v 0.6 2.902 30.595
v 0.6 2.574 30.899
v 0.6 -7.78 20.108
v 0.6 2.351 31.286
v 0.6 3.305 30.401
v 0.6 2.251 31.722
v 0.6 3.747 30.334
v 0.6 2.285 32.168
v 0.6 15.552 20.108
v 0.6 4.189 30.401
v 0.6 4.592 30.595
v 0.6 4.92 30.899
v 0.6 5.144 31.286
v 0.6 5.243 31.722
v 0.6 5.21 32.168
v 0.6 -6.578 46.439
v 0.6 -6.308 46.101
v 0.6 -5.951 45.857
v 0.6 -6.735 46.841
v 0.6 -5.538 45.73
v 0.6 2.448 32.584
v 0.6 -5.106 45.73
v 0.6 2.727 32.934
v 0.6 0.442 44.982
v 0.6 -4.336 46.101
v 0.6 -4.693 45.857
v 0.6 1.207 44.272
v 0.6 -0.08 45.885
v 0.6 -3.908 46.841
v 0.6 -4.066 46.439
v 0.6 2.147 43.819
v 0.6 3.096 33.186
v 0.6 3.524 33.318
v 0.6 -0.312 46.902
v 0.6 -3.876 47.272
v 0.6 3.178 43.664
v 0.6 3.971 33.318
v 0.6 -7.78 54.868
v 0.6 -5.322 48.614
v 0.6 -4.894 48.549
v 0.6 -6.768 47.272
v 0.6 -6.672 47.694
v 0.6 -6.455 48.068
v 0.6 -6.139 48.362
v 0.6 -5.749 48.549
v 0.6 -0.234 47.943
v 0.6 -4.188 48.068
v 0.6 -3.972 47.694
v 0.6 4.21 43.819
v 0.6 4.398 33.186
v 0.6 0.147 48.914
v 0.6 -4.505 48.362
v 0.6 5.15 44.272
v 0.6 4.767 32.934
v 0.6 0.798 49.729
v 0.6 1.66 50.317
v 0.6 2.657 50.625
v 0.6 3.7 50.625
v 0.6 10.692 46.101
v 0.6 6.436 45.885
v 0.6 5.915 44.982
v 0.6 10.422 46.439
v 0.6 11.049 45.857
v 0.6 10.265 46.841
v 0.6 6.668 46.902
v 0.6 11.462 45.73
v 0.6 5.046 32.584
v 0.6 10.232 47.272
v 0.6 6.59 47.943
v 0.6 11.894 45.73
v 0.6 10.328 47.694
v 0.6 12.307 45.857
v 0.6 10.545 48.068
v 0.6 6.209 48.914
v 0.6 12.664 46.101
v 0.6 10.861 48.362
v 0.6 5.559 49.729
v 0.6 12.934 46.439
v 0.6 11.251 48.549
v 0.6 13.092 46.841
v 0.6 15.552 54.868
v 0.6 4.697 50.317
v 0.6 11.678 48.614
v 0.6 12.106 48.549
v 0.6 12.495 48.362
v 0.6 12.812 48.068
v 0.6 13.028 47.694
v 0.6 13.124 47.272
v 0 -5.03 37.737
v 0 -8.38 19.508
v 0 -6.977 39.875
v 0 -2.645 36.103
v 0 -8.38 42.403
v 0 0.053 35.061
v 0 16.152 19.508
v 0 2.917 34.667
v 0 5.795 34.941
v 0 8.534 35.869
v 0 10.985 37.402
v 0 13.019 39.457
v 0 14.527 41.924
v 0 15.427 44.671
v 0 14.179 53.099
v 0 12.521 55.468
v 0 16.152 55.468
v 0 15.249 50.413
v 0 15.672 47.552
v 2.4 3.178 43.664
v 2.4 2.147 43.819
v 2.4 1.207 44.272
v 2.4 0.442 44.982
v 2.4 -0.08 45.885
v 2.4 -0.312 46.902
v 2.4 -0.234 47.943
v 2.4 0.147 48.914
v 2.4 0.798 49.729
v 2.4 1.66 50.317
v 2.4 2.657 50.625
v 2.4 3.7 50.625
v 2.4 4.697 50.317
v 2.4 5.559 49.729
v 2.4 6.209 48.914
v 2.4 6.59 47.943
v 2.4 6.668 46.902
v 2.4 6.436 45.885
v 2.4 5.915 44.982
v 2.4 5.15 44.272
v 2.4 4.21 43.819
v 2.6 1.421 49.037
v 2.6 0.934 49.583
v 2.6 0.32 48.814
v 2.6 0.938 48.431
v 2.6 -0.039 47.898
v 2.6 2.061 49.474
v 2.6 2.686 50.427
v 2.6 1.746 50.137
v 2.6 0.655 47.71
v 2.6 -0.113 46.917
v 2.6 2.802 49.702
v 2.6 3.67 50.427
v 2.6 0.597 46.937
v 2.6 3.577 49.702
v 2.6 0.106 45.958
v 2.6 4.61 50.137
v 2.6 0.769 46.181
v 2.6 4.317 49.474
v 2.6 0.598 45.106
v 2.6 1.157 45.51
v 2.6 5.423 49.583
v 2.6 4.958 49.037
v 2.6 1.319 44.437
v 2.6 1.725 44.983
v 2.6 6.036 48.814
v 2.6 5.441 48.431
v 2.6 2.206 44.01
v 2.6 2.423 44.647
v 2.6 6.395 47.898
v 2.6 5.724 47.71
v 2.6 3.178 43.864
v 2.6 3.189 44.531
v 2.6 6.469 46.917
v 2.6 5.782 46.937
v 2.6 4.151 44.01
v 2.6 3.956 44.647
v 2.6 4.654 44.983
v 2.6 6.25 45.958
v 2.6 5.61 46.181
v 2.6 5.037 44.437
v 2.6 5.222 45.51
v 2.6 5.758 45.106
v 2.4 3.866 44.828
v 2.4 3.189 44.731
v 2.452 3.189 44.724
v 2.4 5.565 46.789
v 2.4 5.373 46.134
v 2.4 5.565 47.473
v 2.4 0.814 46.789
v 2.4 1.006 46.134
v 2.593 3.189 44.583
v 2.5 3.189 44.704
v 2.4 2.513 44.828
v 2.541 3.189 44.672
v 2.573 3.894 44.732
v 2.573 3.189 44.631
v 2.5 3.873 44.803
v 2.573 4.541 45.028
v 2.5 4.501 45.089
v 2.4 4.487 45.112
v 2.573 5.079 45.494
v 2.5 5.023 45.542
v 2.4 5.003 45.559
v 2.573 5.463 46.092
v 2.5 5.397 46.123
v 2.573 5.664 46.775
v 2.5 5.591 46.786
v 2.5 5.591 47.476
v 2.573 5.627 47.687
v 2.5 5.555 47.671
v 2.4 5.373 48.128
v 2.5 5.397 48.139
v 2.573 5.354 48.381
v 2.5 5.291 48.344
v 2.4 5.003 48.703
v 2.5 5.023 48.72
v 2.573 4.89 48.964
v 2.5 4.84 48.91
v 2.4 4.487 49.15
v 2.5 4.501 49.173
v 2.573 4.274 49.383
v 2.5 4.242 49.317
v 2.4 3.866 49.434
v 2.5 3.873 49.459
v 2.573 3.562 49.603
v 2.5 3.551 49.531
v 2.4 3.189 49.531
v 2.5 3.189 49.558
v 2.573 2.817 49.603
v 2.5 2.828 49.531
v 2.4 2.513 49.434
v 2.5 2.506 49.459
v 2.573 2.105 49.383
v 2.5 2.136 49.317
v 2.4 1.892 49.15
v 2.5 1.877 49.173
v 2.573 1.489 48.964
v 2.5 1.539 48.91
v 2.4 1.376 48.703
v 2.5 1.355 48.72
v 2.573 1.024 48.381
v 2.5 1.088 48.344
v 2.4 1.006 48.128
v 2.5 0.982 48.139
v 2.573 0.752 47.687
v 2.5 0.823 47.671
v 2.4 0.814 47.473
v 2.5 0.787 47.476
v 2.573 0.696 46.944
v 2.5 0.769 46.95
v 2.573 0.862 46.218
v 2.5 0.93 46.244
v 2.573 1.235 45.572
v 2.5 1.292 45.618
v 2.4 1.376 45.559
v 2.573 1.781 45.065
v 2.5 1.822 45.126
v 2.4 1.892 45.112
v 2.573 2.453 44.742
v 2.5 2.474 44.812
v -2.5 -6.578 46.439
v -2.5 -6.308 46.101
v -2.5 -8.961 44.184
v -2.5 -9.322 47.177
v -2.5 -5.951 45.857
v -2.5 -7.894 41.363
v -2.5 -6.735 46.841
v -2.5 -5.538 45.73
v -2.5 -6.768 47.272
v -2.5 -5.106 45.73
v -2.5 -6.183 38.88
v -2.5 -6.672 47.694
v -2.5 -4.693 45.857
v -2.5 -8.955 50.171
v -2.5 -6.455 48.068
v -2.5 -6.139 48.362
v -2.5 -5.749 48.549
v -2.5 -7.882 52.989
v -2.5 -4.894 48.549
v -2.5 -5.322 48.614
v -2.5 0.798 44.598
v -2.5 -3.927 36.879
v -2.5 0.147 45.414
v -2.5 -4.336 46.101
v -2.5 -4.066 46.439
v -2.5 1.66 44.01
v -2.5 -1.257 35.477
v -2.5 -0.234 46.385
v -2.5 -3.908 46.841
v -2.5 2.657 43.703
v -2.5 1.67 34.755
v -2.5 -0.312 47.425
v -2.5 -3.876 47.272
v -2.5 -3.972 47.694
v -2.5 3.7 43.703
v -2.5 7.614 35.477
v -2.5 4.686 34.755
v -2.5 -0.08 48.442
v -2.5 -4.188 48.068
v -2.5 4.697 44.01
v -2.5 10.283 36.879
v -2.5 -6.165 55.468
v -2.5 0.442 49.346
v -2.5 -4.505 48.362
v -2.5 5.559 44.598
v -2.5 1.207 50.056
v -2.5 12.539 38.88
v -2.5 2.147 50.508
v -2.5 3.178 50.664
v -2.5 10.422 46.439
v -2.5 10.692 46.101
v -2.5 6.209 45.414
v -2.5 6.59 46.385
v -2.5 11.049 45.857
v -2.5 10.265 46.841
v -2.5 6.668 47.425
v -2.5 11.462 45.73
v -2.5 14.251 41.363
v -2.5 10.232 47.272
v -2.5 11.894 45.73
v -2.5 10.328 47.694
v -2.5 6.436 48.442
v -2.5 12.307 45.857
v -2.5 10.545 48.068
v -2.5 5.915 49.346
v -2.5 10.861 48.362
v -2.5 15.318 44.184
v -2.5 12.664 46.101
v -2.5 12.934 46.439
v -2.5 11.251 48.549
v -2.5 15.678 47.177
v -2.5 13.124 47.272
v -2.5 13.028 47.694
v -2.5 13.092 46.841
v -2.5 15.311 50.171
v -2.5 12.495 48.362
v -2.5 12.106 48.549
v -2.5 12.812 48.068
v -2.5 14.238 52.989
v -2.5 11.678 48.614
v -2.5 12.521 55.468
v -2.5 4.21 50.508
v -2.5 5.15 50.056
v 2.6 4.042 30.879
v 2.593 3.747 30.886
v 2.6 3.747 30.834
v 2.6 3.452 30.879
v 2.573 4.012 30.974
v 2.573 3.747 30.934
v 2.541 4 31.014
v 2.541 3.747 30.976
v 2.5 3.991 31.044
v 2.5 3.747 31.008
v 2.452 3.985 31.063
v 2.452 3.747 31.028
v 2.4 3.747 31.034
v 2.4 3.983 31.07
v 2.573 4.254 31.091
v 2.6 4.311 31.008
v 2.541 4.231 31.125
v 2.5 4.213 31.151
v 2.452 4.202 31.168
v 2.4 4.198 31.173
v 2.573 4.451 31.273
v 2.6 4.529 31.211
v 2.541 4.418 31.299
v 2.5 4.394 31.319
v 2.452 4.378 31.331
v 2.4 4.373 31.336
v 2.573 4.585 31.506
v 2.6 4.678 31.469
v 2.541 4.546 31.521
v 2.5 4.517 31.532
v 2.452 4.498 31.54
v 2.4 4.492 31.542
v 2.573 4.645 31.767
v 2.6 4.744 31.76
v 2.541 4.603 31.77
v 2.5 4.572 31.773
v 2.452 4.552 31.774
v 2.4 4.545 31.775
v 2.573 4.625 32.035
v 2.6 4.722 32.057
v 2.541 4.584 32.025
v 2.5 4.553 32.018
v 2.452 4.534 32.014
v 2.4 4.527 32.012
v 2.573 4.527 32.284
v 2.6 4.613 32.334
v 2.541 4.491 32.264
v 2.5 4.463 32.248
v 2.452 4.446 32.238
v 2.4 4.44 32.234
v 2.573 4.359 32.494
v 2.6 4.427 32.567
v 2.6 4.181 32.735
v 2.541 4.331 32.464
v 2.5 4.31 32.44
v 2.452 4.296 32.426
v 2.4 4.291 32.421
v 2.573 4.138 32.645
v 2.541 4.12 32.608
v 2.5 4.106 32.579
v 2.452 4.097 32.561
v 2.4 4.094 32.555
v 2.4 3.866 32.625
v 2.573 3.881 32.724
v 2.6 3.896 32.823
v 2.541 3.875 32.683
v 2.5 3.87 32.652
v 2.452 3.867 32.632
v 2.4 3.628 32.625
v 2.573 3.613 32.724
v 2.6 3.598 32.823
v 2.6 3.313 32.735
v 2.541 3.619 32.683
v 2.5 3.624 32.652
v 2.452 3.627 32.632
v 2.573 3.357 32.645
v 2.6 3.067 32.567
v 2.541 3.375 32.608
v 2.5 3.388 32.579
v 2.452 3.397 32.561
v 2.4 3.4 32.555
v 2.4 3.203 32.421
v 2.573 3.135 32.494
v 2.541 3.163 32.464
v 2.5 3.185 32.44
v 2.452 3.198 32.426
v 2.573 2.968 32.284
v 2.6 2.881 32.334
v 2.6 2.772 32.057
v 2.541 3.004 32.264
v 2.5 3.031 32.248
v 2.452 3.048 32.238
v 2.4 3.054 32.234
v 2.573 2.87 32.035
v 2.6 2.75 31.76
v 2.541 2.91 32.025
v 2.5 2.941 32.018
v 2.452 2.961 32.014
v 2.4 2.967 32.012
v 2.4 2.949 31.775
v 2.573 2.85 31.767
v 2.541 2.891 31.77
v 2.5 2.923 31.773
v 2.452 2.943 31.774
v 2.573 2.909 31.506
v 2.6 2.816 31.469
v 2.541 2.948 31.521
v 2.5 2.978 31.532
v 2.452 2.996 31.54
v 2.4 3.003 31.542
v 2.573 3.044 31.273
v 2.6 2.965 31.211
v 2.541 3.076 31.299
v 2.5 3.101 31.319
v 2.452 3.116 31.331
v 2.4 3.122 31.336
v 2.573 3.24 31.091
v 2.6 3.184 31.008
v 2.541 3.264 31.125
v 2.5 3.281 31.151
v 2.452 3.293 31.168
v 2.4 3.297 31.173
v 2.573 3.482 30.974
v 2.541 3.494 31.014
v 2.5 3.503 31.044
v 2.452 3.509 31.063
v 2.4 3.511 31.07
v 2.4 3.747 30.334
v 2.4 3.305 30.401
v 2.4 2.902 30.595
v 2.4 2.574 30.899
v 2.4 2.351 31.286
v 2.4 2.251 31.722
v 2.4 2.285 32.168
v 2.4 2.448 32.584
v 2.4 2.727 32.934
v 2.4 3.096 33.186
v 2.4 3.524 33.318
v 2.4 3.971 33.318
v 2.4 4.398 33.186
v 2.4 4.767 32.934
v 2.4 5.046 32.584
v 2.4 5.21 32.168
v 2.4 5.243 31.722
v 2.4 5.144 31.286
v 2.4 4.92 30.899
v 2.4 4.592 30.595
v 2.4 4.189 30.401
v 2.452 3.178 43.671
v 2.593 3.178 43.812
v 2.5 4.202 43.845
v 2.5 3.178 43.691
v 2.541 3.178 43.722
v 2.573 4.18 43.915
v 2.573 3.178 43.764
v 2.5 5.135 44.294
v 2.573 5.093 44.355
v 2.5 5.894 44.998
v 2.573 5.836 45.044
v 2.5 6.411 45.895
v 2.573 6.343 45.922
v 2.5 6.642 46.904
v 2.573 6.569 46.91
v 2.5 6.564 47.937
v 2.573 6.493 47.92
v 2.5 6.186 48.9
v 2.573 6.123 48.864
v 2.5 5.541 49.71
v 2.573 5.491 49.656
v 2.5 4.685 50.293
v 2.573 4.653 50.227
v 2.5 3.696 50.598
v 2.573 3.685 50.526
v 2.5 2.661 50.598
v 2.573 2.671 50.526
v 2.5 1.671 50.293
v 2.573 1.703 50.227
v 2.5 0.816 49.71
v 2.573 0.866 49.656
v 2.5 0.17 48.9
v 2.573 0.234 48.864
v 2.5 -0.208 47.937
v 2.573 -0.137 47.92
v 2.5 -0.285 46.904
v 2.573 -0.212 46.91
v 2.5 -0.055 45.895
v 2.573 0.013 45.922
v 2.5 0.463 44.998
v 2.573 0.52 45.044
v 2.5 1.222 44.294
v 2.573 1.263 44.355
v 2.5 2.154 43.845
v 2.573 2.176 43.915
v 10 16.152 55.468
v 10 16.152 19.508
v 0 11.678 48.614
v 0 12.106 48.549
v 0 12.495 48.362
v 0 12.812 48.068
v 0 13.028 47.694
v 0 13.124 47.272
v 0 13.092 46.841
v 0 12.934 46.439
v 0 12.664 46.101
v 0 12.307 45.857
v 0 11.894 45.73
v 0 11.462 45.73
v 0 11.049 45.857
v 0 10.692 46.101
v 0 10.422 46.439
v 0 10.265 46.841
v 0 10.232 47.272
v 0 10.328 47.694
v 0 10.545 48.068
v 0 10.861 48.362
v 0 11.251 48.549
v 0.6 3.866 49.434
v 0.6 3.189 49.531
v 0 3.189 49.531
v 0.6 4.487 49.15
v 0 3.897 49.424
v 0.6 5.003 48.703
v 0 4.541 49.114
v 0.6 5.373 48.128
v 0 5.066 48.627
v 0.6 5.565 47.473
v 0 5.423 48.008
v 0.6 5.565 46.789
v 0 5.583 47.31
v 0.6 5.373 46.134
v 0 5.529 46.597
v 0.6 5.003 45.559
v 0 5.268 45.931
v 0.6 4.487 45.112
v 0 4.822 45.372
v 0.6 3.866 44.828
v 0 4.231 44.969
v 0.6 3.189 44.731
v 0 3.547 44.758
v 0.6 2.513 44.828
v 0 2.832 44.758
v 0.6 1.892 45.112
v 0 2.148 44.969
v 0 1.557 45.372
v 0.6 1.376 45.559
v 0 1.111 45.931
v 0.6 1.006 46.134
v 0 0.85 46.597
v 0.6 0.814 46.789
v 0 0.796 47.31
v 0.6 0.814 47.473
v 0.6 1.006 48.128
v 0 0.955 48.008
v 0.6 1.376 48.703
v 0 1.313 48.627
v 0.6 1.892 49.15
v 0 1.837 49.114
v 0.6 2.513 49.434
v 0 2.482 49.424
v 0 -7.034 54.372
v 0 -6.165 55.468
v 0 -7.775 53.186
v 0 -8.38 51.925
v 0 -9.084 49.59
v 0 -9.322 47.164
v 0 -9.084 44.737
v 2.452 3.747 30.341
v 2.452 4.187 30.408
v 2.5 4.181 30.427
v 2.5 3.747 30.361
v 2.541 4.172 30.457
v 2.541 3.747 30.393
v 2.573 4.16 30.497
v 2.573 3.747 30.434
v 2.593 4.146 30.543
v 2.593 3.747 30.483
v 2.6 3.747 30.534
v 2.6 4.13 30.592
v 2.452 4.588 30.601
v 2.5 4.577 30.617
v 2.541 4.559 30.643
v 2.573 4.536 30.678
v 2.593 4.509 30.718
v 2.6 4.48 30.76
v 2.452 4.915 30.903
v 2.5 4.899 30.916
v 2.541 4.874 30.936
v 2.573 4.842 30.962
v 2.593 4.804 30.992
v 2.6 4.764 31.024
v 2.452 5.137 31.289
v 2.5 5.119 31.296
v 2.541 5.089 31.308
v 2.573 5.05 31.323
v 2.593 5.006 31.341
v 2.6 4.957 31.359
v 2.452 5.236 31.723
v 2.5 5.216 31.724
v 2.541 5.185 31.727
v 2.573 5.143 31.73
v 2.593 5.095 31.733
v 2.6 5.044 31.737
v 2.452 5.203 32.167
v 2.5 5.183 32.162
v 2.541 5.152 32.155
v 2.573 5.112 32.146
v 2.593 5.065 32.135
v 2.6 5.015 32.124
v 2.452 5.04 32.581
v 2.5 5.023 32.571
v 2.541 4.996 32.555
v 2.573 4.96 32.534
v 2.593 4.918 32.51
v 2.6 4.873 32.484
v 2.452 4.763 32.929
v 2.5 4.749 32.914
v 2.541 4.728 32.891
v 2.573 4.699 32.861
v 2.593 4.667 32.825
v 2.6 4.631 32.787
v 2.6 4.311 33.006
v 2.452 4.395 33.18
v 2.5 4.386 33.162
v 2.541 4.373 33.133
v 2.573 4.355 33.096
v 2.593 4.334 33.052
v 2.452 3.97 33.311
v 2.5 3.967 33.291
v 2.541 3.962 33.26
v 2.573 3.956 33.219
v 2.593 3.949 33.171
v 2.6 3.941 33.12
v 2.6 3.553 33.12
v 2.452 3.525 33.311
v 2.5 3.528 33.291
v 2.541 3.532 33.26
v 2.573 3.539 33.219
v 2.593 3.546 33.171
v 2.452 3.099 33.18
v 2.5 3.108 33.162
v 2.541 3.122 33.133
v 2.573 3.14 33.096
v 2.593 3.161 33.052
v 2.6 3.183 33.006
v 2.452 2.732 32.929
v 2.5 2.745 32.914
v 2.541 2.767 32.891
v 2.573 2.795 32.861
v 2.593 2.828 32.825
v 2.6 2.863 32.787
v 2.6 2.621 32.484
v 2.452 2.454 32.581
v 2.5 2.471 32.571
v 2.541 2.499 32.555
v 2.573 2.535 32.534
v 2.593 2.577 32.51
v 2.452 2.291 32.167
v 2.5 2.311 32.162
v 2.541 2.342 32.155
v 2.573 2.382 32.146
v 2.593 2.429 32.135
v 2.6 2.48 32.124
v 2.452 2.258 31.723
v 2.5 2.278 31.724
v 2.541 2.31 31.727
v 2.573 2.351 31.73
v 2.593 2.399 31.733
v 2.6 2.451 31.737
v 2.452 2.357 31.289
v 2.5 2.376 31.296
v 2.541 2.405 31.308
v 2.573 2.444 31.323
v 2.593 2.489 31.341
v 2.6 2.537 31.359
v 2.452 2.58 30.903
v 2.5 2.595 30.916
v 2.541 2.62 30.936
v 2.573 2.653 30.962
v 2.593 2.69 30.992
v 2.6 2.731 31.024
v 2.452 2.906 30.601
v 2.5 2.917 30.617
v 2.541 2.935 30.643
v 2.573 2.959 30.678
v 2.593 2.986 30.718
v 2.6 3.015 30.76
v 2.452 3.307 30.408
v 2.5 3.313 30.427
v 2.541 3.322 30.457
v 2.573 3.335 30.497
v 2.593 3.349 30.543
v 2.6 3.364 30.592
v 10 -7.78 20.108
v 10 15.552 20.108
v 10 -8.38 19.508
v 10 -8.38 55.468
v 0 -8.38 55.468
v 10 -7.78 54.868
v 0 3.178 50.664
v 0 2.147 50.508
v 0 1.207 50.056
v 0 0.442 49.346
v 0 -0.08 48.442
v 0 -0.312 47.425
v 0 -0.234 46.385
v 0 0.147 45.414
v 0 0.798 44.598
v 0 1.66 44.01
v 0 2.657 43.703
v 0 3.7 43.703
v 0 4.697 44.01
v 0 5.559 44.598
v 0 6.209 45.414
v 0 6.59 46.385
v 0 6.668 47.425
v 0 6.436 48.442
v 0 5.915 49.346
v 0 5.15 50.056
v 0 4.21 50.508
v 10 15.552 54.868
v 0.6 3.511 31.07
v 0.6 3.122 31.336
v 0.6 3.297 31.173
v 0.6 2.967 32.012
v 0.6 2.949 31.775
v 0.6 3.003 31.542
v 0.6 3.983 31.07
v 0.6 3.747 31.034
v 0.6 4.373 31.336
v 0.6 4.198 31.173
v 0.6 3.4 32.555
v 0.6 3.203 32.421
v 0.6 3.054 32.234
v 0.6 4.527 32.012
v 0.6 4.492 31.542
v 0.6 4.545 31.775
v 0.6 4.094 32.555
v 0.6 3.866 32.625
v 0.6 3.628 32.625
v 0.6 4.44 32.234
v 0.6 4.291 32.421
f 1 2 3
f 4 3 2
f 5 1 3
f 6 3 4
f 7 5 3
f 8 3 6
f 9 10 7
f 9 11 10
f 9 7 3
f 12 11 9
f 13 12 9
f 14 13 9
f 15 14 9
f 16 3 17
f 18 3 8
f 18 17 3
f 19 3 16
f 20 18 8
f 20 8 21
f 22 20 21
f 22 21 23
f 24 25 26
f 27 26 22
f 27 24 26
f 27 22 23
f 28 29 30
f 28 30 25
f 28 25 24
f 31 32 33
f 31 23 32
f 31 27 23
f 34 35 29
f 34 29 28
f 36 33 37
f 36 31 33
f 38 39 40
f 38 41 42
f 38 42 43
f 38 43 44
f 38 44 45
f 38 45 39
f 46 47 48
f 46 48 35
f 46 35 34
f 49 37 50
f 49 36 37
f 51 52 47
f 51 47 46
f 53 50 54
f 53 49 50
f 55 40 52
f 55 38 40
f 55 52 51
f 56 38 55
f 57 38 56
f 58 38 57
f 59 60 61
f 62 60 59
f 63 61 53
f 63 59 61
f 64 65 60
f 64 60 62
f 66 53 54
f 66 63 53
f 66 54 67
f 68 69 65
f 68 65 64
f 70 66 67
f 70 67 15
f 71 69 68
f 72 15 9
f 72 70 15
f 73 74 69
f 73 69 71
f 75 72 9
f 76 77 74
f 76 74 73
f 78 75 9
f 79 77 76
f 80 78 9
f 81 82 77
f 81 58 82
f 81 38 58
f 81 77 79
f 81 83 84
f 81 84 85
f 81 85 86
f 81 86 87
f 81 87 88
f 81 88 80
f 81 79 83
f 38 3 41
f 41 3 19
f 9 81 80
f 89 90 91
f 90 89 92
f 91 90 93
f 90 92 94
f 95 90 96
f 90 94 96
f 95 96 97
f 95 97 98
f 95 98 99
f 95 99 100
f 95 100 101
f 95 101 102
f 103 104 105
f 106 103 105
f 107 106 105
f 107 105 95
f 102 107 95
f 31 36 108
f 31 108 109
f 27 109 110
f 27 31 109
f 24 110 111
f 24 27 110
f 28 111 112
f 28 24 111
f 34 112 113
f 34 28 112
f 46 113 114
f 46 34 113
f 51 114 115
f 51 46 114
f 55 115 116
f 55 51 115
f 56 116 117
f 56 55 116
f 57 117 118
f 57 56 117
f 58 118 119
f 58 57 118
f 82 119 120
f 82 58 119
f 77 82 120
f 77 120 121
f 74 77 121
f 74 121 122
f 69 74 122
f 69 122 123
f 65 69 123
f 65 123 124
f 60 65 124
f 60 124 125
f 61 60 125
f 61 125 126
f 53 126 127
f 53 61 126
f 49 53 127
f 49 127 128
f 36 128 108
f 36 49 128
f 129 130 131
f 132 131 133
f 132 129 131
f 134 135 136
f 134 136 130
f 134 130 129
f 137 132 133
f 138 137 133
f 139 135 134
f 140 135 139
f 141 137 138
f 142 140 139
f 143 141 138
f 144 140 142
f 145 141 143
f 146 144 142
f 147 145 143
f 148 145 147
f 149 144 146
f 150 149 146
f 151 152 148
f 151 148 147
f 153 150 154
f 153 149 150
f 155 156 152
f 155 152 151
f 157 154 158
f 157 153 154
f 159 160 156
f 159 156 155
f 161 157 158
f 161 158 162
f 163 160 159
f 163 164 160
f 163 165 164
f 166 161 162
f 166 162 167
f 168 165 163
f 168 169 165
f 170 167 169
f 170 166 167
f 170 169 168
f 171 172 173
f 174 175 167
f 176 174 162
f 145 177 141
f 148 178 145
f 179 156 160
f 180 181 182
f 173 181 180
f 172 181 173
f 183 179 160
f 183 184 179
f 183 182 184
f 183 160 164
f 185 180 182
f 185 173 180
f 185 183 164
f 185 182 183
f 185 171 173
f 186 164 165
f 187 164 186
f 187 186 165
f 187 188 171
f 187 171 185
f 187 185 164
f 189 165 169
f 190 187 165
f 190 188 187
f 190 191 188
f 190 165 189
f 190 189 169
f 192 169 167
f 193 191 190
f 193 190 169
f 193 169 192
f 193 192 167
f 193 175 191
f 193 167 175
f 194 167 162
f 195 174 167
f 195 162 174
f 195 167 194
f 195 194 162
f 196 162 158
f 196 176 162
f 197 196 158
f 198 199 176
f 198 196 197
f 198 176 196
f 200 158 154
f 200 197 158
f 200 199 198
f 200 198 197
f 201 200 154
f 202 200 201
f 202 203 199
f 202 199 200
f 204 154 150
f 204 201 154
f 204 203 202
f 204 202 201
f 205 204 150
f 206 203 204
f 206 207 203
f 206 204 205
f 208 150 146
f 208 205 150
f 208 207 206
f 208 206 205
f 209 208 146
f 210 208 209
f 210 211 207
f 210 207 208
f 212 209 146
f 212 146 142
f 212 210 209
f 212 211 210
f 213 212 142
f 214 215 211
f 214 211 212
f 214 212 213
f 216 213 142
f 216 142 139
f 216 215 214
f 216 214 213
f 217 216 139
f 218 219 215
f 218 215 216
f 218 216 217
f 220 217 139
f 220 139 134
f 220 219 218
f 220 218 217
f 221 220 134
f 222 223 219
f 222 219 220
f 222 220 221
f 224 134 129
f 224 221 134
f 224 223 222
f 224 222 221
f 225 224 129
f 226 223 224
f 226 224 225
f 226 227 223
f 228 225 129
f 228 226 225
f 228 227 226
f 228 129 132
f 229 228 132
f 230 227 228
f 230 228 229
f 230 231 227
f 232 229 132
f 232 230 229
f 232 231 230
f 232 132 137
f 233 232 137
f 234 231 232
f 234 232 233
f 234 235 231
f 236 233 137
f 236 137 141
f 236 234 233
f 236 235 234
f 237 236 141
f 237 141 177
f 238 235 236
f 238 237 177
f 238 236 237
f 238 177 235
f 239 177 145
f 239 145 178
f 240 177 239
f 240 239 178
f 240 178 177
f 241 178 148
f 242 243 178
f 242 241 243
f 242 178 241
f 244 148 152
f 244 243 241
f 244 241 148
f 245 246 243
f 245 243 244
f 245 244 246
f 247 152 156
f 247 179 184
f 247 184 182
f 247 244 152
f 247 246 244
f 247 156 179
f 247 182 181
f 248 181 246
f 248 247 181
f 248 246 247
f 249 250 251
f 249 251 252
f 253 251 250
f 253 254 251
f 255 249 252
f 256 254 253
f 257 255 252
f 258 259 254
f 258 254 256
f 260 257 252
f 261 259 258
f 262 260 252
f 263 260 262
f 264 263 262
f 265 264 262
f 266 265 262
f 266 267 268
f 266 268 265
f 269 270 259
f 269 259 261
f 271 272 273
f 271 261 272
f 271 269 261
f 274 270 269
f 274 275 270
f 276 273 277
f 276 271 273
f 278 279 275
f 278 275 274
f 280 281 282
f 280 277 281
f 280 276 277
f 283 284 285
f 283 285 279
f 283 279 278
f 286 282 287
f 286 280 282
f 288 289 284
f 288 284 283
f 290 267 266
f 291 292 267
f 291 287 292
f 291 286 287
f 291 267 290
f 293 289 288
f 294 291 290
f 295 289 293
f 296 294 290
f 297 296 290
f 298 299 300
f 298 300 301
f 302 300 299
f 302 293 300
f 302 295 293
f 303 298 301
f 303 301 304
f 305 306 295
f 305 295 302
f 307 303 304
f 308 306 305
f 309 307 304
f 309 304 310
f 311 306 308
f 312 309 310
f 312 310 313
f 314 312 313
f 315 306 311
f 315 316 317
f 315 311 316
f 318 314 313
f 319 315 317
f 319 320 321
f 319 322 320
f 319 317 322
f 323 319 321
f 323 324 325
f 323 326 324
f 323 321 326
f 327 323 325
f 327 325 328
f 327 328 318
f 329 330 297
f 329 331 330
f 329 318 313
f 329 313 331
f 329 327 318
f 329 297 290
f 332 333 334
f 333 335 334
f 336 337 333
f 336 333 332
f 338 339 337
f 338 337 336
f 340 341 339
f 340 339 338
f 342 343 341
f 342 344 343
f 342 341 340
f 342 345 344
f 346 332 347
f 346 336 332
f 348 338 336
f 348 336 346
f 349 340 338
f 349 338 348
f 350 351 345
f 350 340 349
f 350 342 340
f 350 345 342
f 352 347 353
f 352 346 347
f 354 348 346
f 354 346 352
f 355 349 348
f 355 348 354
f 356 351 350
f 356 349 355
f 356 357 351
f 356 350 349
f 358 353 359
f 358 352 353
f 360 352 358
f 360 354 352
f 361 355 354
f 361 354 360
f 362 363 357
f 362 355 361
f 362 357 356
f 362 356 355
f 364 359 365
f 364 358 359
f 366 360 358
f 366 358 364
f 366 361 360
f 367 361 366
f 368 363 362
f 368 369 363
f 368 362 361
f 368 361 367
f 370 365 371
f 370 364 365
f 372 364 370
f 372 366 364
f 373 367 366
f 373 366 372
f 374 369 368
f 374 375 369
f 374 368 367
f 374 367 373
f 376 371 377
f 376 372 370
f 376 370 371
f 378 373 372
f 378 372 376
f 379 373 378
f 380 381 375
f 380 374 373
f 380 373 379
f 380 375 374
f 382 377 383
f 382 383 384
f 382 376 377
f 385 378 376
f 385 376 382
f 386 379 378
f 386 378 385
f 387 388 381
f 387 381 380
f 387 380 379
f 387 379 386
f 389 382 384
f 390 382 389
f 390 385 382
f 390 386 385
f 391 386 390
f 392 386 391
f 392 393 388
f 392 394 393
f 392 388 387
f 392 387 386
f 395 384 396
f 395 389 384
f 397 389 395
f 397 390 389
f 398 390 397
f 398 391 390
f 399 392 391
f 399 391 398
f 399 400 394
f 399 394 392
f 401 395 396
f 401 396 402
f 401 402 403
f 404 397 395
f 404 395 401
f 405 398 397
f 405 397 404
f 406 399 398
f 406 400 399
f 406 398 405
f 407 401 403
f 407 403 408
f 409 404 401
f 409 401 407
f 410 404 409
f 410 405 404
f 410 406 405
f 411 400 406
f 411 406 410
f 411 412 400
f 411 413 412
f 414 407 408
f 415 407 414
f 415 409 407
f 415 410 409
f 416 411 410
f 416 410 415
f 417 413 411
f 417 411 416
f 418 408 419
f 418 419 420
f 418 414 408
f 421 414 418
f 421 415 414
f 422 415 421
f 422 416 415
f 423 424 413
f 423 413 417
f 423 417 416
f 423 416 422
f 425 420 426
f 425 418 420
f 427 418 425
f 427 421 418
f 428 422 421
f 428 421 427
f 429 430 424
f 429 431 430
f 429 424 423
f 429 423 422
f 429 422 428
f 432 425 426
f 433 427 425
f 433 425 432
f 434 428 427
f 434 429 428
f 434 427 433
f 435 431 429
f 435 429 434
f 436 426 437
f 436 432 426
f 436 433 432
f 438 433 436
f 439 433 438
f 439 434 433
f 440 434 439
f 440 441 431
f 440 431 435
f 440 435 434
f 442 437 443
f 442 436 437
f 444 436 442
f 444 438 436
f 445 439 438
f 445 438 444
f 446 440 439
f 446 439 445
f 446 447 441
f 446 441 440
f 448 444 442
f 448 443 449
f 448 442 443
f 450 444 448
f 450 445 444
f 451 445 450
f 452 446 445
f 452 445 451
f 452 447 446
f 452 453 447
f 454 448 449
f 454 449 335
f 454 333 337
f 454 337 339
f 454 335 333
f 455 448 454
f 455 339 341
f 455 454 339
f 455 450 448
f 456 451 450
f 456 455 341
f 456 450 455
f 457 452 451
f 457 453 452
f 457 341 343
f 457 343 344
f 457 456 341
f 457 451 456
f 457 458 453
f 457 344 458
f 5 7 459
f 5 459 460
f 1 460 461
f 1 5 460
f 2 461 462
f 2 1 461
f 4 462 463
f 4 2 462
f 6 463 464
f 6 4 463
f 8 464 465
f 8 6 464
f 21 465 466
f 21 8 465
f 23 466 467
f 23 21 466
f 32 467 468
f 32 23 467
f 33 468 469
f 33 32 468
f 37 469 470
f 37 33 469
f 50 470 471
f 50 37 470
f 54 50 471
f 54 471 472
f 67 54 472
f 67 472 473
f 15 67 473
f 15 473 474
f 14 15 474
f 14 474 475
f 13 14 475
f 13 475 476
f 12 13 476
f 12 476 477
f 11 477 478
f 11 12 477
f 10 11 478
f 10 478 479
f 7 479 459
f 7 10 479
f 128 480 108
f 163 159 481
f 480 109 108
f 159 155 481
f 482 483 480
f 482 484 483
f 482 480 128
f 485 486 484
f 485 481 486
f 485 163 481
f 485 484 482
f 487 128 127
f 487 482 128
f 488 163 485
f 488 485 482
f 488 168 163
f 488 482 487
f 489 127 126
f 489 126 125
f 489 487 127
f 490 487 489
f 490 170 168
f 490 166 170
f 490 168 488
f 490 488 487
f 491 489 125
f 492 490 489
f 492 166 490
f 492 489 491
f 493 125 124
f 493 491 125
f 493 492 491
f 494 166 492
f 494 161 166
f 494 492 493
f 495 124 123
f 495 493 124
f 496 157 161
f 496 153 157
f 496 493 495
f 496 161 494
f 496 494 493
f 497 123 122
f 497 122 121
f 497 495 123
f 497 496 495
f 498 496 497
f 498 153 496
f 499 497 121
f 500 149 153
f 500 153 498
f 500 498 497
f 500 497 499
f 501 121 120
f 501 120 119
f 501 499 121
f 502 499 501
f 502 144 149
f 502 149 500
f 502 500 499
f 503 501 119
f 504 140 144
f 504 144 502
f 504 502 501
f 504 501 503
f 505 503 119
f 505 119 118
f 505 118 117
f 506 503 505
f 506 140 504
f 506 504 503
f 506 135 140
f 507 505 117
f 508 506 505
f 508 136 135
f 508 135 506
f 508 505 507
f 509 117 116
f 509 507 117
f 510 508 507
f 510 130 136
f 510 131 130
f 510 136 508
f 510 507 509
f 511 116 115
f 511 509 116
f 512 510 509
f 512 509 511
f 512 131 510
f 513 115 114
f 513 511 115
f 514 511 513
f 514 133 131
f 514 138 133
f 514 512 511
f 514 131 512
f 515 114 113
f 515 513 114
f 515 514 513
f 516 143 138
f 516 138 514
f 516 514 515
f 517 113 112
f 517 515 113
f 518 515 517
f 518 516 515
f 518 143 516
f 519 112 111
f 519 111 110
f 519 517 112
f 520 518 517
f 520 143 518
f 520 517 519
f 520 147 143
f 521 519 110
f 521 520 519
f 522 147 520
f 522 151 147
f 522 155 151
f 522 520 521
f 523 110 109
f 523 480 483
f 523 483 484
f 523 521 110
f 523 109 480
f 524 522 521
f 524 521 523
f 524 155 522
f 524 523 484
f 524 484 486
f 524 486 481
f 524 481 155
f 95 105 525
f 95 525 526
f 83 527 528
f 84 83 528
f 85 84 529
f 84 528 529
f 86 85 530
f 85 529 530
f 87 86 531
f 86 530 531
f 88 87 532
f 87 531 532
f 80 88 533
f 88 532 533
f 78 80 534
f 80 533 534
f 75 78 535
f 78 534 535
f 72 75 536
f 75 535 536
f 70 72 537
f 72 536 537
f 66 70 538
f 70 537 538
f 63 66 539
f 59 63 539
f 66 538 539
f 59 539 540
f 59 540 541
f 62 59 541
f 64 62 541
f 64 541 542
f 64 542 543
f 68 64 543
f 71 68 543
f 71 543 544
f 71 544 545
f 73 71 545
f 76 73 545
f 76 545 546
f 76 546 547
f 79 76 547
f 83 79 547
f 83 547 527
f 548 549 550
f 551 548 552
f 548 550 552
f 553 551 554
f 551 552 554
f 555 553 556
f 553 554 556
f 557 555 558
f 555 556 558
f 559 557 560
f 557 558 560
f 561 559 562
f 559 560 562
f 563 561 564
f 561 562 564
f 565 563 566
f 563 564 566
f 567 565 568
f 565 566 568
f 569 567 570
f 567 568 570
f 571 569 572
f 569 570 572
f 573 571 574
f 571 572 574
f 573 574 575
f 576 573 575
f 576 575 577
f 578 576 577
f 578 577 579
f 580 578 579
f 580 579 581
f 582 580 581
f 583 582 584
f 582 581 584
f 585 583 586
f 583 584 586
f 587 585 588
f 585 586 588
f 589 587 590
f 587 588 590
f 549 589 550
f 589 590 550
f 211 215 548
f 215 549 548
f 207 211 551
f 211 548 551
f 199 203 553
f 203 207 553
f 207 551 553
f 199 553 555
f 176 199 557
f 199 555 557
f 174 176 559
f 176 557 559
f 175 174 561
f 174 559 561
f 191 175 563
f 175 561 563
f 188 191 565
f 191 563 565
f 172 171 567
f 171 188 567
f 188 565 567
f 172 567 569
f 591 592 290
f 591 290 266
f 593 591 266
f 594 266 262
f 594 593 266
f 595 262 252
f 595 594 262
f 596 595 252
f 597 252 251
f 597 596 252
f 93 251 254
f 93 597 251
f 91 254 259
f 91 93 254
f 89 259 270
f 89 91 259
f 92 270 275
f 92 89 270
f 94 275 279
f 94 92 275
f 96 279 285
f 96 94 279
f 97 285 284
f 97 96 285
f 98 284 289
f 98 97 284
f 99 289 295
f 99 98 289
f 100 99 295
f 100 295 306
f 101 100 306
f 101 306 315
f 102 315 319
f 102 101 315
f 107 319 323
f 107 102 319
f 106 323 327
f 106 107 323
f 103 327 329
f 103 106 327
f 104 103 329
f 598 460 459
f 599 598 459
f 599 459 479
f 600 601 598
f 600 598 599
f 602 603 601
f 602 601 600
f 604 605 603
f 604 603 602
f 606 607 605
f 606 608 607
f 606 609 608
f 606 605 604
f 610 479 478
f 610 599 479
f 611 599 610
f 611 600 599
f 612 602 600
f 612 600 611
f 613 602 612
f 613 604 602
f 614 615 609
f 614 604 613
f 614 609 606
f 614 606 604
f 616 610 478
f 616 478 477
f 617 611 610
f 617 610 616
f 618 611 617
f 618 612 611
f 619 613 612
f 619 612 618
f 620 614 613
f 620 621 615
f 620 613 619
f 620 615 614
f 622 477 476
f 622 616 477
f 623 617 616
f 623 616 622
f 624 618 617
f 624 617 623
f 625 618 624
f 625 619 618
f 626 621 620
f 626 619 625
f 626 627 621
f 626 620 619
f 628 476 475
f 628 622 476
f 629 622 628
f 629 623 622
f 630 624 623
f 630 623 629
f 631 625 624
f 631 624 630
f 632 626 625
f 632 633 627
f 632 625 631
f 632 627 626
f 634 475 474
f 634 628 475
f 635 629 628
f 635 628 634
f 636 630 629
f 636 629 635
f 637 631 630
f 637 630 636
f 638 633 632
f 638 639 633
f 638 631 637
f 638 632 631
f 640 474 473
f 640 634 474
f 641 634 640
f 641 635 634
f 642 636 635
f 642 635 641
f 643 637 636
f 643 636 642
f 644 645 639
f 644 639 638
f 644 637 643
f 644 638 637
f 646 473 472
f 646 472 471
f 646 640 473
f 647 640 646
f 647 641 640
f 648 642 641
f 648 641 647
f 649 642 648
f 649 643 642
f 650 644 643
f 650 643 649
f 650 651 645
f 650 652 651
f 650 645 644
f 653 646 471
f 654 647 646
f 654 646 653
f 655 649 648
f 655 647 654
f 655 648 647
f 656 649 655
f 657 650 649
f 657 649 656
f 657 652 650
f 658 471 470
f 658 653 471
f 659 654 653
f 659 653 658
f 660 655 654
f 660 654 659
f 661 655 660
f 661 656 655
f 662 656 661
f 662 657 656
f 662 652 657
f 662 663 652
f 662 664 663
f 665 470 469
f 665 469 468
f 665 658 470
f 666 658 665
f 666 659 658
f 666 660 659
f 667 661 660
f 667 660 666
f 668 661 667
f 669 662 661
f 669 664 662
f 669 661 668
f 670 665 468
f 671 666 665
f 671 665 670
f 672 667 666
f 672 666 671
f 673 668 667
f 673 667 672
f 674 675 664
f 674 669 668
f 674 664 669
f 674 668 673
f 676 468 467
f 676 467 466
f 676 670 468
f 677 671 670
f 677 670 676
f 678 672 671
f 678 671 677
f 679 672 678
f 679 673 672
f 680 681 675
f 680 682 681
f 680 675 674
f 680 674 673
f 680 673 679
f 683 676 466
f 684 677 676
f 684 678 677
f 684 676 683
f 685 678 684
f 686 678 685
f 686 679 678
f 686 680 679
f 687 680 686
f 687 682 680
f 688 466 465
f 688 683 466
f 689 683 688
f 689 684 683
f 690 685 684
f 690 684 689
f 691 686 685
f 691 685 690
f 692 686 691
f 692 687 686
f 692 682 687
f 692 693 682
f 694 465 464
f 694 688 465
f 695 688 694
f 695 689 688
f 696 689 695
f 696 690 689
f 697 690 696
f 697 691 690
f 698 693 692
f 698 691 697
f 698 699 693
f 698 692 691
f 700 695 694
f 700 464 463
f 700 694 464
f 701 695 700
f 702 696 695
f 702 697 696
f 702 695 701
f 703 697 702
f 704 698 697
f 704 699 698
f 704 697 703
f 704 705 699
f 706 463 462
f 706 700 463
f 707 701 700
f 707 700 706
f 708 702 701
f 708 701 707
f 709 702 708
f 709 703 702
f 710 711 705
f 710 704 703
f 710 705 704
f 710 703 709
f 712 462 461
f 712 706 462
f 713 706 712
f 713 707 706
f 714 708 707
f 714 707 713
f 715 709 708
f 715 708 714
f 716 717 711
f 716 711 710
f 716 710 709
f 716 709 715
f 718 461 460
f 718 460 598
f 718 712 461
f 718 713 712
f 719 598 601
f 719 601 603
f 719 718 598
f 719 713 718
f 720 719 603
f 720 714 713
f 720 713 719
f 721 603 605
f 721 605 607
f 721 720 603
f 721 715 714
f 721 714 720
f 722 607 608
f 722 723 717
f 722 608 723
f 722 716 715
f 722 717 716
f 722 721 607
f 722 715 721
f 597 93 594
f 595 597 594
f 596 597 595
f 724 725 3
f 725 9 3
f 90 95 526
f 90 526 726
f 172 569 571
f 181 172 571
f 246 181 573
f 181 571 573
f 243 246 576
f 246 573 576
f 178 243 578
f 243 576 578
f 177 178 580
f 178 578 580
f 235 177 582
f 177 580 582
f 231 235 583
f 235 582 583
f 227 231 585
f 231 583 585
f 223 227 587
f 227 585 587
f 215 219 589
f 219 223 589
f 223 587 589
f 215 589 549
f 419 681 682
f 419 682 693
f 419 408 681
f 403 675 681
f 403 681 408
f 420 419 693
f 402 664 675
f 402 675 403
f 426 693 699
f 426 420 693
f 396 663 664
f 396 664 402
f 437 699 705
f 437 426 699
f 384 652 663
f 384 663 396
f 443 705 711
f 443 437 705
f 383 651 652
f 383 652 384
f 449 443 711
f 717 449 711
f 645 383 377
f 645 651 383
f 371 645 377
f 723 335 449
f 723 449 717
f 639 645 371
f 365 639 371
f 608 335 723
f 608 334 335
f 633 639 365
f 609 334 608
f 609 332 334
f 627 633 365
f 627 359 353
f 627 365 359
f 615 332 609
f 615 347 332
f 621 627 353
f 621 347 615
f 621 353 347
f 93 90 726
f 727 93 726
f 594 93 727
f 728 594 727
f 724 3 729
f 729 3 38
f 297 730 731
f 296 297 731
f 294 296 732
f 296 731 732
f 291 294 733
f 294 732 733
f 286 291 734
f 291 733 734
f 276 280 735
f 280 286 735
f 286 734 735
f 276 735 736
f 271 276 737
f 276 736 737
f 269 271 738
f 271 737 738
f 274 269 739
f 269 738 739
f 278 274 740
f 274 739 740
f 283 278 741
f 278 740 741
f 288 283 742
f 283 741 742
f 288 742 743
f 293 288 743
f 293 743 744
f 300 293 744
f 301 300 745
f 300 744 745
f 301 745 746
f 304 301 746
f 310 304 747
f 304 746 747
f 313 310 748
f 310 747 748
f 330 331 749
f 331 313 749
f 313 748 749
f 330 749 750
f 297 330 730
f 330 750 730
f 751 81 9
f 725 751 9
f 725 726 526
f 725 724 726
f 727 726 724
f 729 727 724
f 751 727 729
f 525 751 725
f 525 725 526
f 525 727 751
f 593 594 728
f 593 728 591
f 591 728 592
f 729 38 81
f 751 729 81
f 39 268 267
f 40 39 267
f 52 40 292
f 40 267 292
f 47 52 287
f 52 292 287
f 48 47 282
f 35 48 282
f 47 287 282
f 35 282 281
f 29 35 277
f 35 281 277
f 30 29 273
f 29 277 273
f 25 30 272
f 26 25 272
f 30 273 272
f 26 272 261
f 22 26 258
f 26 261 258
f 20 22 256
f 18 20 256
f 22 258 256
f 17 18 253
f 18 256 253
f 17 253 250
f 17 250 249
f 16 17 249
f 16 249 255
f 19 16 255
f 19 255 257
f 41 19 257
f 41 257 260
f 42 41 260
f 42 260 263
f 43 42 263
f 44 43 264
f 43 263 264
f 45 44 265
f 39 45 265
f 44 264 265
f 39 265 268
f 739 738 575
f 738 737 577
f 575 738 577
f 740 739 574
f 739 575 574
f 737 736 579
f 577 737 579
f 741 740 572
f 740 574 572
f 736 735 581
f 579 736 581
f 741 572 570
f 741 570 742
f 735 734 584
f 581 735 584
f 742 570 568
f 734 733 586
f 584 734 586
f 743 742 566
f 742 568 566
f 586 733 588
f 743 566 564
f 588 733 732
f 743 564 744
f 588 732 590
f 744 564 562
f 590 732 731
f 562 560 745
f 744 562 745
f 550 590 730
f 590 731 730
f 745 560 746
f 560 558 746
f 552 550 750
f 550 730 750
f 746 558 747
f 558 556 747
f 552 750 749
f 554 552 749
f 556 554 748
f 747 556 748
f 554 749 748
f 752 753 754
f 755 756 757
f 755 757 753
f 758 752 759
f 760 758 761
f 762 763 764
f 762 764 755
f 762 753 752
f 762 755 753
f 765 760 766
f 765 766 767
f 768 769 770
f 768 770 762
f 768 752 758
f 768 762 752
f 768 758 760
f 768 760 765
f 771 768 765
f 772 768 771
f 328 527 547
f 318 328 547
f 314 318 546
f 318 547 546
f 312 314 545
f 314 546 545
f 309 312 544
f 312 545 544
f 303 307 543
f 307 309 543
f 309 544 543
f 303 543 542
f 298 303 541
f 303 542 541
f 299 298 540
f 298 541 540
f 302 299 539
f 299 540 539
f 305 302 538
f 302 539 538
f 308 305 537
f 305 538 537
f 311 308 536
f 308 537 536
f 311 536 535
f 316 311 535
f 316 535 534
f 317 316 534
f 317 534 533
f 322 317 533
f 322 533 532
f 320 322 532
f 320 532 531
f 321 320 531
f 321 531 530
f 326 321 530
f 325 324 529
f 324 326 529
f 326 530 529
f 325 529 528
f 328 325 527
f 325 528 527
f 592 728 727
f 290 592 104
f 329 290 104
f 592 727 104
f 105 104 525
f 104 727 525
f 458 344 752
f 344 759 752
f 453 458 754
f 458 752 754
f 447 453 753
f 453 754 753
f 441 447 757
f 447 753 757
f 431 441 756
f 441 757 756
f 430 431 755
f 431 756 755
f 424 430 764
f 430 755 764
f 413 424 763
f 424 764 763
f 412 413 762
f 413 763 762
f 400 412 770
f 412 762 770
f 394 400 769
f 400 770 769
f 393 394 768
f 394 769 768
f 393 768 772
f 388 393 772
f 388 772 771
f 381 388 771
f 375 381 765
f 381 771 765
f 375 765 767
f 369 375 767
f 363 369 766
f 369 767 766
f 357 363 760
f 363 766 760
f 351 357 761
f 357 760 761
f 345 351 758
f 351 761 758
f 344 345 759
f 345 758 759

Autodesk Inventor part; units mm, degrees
ref_plane "YZ Plane" through (0, 0, 0) normal (1, 0, 0) x (0, 1, 0)
ref_plane "XZ Plane" through (0, 0, 0) normal (0, 1, 0) x (-1, 0, 0)
ref_plane "XY Plane" through (0, 0, 0) normal (0, 0, 1) x (1, 0, 0)
sketch "Sketch1" plane through (0, 0, 0) normal (1, 0, 0) x (0, 1, 0)
  circle A0 centre (3.7472, 31.8344) radius 0.7 projected
  arc A1 (6.295, 21.1336) -> (6.4355, 23.5076) centre (-1.824, 22.8051) ccw projected
  arc A2 (5.4476, 20.9667) -> (6.295, 21.1336) centre (3.7472, 31.8344) ccw projected
  arc A3 (4.4173, 23.1101) -> (5.4476, 20.9667) centre (12.3263, 25.5922) ccw projected
  arc A4 (3.7308, 23.0845) -> (4.4173, 23.1101) centre (3.7472, 31.8344) ccw projected
  arc A5 (2.8636, 20.87) -> (3.7308, 23.0845) centre (-4.3415, 24.9686) ccw projected
  arc A6 (2.006, 20.9731) -> (2.8636, 20.87) centre (3.7472, 31.8344) ccw projected
  arc A7 (1.6886, 23.33) -> (2.006, 20.9731) centre (9.9774, 23.2466) ccw projected
  arc A8 (1.0277, 23.5178) -> (1.6886, 23.33) centre (3.7472, 31.8344) ccw projected
  arc A9 (-0.4814, 21.6797) -> (1.0277, 23.5178) centre (-6.0673, 27.8042) ccw projected
  arc A10 (-1.2651, 22.0427) -> (-0.4814, 21.6797) centre (3.7472, 31.8344) ccw projected
  arc A11 (-0.8387, 24.3824) -> (-1.2651, 22.0427) centre (7.0187, 21.7417) ccw projected
  arc A12 (-1.4092, 24.7652) -> (-0.8387, 24.3824) centre (3.7472, 31.8344) ccw projected
  arc A13 (-3.4124, 23.4834) -> (-1.4092, 24.7652) centre (-6.8324, 31.0342) ccw projected
  arc A14 (-4.0456, 24.0709) -> (-3.4124, 23.4834) centre (3.7472, 31.8344) ccw projected
  arc A15 (-2.917, 26.1642) -> (-4.0456, 24.0709) centre (3.7397, 21.2247) ccw projected
  arc A16 (-3.3414, 26.7046) -> (-2.917, 26.1642) centre (3.7472, 31.8344) ccw projected
  arc A17 (-5.6426, 26.1045) -> (-3.3414, 26.7046) centre (-6.5618, 34.3427) ccw projected
  arc A18 (-6.0632, 26.8589) -> (-5.6426, 26.1045) centre (3.7472, 31.8344) ccw projected
  arc A19 (-4.343, 28.5011) -> (-6.0632, 26.8589) centre (0.4615, 21.7463) ccw projected
  arc A20 (-4.5796, 29.1461) -> (-4.343, 28.5011) centre (3.7472, 31.8344) ccw projected
  arc A21 (-6.9537, 29.2866) -> (-4.5796, 29.1461) centre (-5.2822, 37.4056) ccw projected
  arc A22 (-7.1206, 30.134) -> (-6.9537, 29.2866) centre (3.7472, 31.8344) ccw projected
  arc A23 (-4.9771, 31.1643) -> (-7.1206, 30.134) centre (-2.4951, 23.2553) ccw projected
  arc A24 (-5.0028, 31.8508) -> (-4.9771, 31.1643) centre (3.7472, 31.8344) ccw projected
  arc A25 (-7.2173, 32.718) -> (-5.0028, 31.8508) centre (-3.1187, 39.9231) ccw projected
  arc A26 (-7.1142, 33.5756) -> (-7.2173, 32.718) centre (3.7472, 31.8344) ccw projected
  arc A27 (-4.7572, 33.893) -> (-7.1142, 33.5756) centre (-4.8407, 25.6042) ccw projected
  arc A28 (-4.5695, 34.5539) -> (-4.7572, 33.893) centre (3.7472, 31.8344) ccw projected
  arc A29 (-6.4076, 36.063) -> (-4.5695, 34.5539) centre (-0.2831, 41.6489) ccw projected
  arc A30 (-6.0445, 36.8467) -> (-6.4076, 36.063) centre (3.7472, 31.8344) ccw projected
  arc A31 (-3.7048, 36.4203) -> (-6.0445, 36.8467) centre (-6.3456, 28.5629) ccw projected
  arc A32 (-3.3221, 36.9908) -> (-3.7048, 36.4203) centre (3.7472, 31.8344) ccw projected
  arc A33 (-4.6039, 38.994) -> (-3.3221, 36.9908) centre (2.947, 42.414) ccw projected
  arc A34 (-4.0164, 39.6272) -> (-4.6039, 38.994) centre (3.7472, 31.8344) ccw projected
  arc A35 (-1.923, 38.4986) -> (-4.0164, 39.6272) centre (-6.8626, 31.8419) ccw projected
  arc A36 (-1.3827, 38.923) -> (-1.923, 38.4986) centre (3.7472, 31.8344) ccw projected
  arc A37 (-1.9827, 41.2242) -> (-1.3827, 38.923) centre (6.2554, 42.1434) ccw projected
  arc A38 (-1.2283, 41.6448) -> (-1.9827, 41.2242) centre (3.7472, 31.8344) ccw projected
  arc A39 (0.4139, 39.9246) -> (-1.2283, 41.6448) centre (-6.341, 35.1201) ccw projected
  arc A40 (1.0589, 40.1612) -> (0.4139, 39.9246) centre (3.7472, 31.8344) ccw projected
  arc A41 (1.1993, 42.5353) -> (1.0589, 40.1612) centre (9.3183, 40.8638) ccw projected
  arc A42 (2.0468, 42.7022) -> (1.1993, 42.5353) centre (3.7472, 31.8344) ccw projected
  arc A43 (3.077, 40.5587) -> (2.0468, 42.7022) centre (-4.8319, 38.0767) ccw projected
  arc A44 (3.7636, 40.5844) -> (3.077, 40.5587) centre (3.7472, 31.8344) ccw projected
  arc A45 (4.6308, 42.7989) -> (3.7636, 40.5844) centre (11.8359, 38.7003) ccw projected
  arc A46 (5.4883, 42.6958) -> (4.6308, 42.7989) centre (3.7472, 31.8344) ccw projected
  arc A47 (5.8058, 40.3388) -> (5.4883, 42.6958) centre (-2.4831, 40.4223) ccw projected
  arc A48 (6.4667, 40.1511) -> (5.8058, 40.3388) centre (3.7472, 31.8344) ccw projected
  arc A49 (7.9757, 41.9892) -> (6.4667, 40.1511) centre (13.5616, 35.8647) ccw projected
  arc A50 (8.7594, 41.6261) -> (7.9757, 41.9892) centre (3.7472, 31.8344) ccw projected
  arc A51 (8.333, 39.2865) -> (8.7594, 41.6261) centre (0.4756, 41.9272) ccw projected
  arc A52 (8.9036, 38.9037) -> (8.333, 39.2865) centre (3.7472, 31.8344) ccw projected
  arc A53 (10.9068, 40.1855) -> (8.9036, 38.9037) centre (14.3267, 32.6346) ccw projected
  arc A54 (11.5399, 39.598) -> (10.9068, 40.1855) centre (3.7472, 31.8344) ccw projected
  arc A55 (10.4114, 37.5046) -> (11.5399, 39.598) centre (3.7546, 42.4442) ccw projected
  arc A56 (10.8357, 36.9643) -> (10.4114, 37.5046) centre (3.7472, 31.8344) ccw projected
  arc A57 (13.137, 37.5643) -> (10.8357, 36.9643) centre (14.0562, 29.3262) ccw projected
  arc A58 (13.5576, 36.81) -> (13.137, 37.5643) centre (3.7472, 31.8344) ccw projected
  arc A59 (11.8374, 35.1678) -> (13.5576, 36.81) centre (7.0328, 41.9226) ccw projected
  arc A60 (12.074, 34.5227) -> (11.8374, 35.1678) centre (3.7472, 31.8344) ccw projected
  arc A61 (14.448, 34.3823) -> (12.074, 34.5227) centre (12.7765, 26.2633) ccw projected
  arc A62 (14.615, 33.5348) -> (14.448, 34.3823) centre (3.7472, 31.8344) ccw projected
  arc A63 (12.4715, 32.5046) -> (14.615, 33.5348) centre (9.9894, 40.4135) ccw projected
  arc A64 (12.4972, 31.818) -> (12.4715, 32.5046) centre (3.7472, 31.8344) ccw projected
  arc A65 (14.7116, 30.9508) -> (12.4972, 31.818) centre (10.613, 23.7458) ccw projected
  arc A66 (14.6085, 30.0933) -> (14.7116, 30.9508) centre (3.7472, 31.8344) ccw projected
  arc A67 (12.2516, 29.7758) -> (14.6085, 30.0933) centre (12.335, 38.0647) ccw projected
  arc A68 (12.0638, 29.1149) -> (12.2516, 29.7758) centre (3.7472, 31.8344) ccw projected
  arc A69 (13.9019, 27.6059) -> (12.0638, 29.1149) centre (7.7775, 22.02) ccw projected
  arc A70 (13.5389, 26.8222) -> (13.9019, 27.6059) centre (3.7472, 31.8344) ccw projected
  arc A71 (11.1992, 27.2486) -> (13.5389, 26.8222) centre (13.8399, 35.106) ccw projected
  arc A72 (10.8164, 26.6781) -> (11.1992, 27.2486) centre (3.7472, 31.8344) ccw projected
  arc A73 (12.0982, 24.6748) -> (10.8164, 26.6781) centre (4.5474, 21.2549) ccw projected
  arc A74 (11.5108, 24.0417) -> (12.0982, 24.6748) centre (3.7472, 31.8344) ccw projected
  arc A75 (9.4174, 25.1702) -> (11.5108, 24.0417) centre (14.3569, 31.827) ccw projected
  arc A76 (8.877, 24.7459) -> (9.4174, 25.1702) centre (3.7472, 31.8344) ccw projected
  arc A77 (9.4771, 22.4446) -> (8.877, 24.7459) centre (1.2389, 21.5254) ccw projected
  arc A78 (8.7227, 22.024) -> (9.4771, 22.4446) centre (3.7472, 31.8344) ccw projected
  arc A79 (7.0805, 23.7442) -> (8.7227, 22.024) centre (13.8353, 28.5488) ccw projected
  arc A80 (6.4355, 23.5076) -> (7.0805, 23.7442) centre (3.7472, 31.8344) ccw projected
  line L0 (4.9954, 45.8746) -> (4.8965, 48.5188) projected
  arc A81 (4.8965, 48.5188) -> (4.9954, 45.8746) centre (3.1894, 47.131) ccw projected
  arc A82 (-0.8751, 51.5446) -> (0.2488, 49.4581) centre (4.3942, 53.0372) ccw projected
  arc A83 (-0.1346, 52.1261) -> (-0.8751, 51.5446) centre (3.1894, 47.131) ccw projected
  arc A84 (1.6258, 50.5395) -> (-0.1346, 52.1261) centre (-2.834, 47.3609) ccw projected
  arc A85 (2.1783, 50.7421) -> (1.6258, 50.5395) centre (3.1894, 47.131) ccw projected
  arc A86 (2.4954, 53.0907) -> (2.1783, 50.7421) centre (7.6357, 51.201) ccw projected
  arc A87 (3.4362, 53.1259) -> (2.4954, 53.0907) centre (3.1894, 47.131) ccw projected
  arc A88 (3.9279, 50.8076) -> (3.4362, 53.1259) centre (-1.5485, 50.8574) ccw projected
  arc A89 (4.4939, 50.6468) -> (3.9279, 50.8076) centre (3.1894, 47.131) ccw projected
  arc A90 (6.131, 52.3605) -> (4.4939, 50.6468) centre (9.1788, 47.8103) ccw projected
  arc A91 (6.9128, 51.8359) -> (6.131, 52.3605) centre (3.1894, 47.131) ccw projected
  arc A92 (5.9479, 49.6713) -> (6.9128, 51.8359) centre (1.5467, 52.9306) ccw projected
  arc A93 (6.3113, 49.2085) -> (5.9479, 49.6713) centre (3.1894, 47.131) ccw projected
  arc A94 (8.643, 49.6327) -> (6.3113, 49.2085) centre (8.4342, 44.1601) ccw projected
  arc A95 (8.9672, 48.7488) -> (8.643, 49.6327) centre (3.1894, 47.131) ccw projected
  arc A96 (6.9142, 47.5648) -> (8.9672, 48.7488) centre (5.2694, 52.7886) ccw projected
  arc A97 (6.9362, 46.9768) -> (6.9142, 47.5648) centre (3.1894, 47.131) ccw projected
  arc A98 (9.0719, 45.9494) -> (6.9362, 46.9768) centre (5.6863, 41.6447) ccw projected
  arc A99 (8.8147, 45.0438) -> (9.0719, 45.9494) centre (3.1894, 47.131) ccw projected
  arc A100 (6.4578, 45.2925) -> (8.8147, 45.0438) centre (8.1976, 50.4855) ccw projected
  arc A101 (6.13, 44.8039) -> (6.4578, 45.2925) centre (3.1894, 47.131) ccw projected
  arc A102 (7.254, 42.7174) -> (6.13, 44.8039) centre (1.9846, 41.2248) ccw projected
  arc A103 (6.5135, 42.1359) -> (7.254, 42.7174) centre (3.1894, 47.131) ccw projected
  arc A104 (4.753, 43.7225) -> (6.5135, 42.1359) centre (9.2128, 46.9012) ccw projected
  arc A105 (4.2006, 43.5199) -> (4.753, 43.7225) centre (3.1894, 47.131) ccw projected
  arc A106 (3.8835, 41.1713) -> (4.2006, 43.5199) centre (-1.2568, 43.061) ccw projected
  arc A107 (2.9426, 41.1361) -> (3.8835, 41.1713) centre (3.1894, 47.131) ccw projected
  arc A108 (2.4509, 43.4544) -> (2.9426, 41.1361) centre (7.9274, 43.4046) ccw projected
  arc A109 (1.8849, 43.6152) -> (2.4509, 43.4544) centre (3.1894, 47.131) ccw projected
  arc A110 (0.2479, 41.9015) -> (1.8849, 43.6152) centre (-2.8, 46.4517) ccw projected
  arc A111 (-0.534, 42.4261) -> (0.2479, 41.9015) centre (3.1894, 47.131) ccw projected
  arc A112 (0.4309, 44.5907) -> (-0.534, 42.4261) centre (4.8322, 41.3314) ccw projected
  arc A113 (0.0675, 45.0535) -> (0.4309, 44.5907) centre (3.1894, 47.131) ccw projected
  arc A114 (-2.2641, 44.6293) -> (0.0675, 45.0535) centre (-2.0554, 50.1019) ccw projected
  arc A115 (-2.5884, 45.5132) -> (-2.2641, 44.6293) centre (3.1894, 47.131) ccw projected
  arc A116 (-0.5354, 46.6972) -> (-2.5884, 45.5132) centre (1.1095, 41.4734) ccw projected
  arc A117 (-0.5574, 47.2852) -> (-0.5354, 46.6972) centre (3.1894, 47.131) ccw projected
  arc A118 (-2.6931, 48.3126) -> (-0.5574, 47.2852) centre (0.6926, 52.6173) ccw projected
  arc A119 (-2.4358, 49.2183) -> (-2.6931, 48.3126) centre (3.1894, 47.131) ccw projected
  arc A120 (-0.079, 48.9695) -> (-2.4358, 49.2183) centre (-1.8187, 43.7765) ccw projected
  arc A121 (0.2488, 49.4581) -> (-0.079, 48.9695) centre (3.1894, 47.131) ccw projected
  line L1 (16.152, 19.5075) -> (-8.3796, 19.5075)
  line L2 (-8.3796, 19.5075) -> (-8.3796, 55.4678)
  line L3 (-8.3796, 55.4678) -> (16.152, 55.4678)
  line L4 (16.152, 55.4678) -> (16.152, 19.5075)
  point P0 (0, 0)
extrude "Extrusion1" add sketch "Sketch1" along normal blind 10 contours A0 | A2 A3 A4 A5 A6 A7 A8 A9 A10 A11 A12 A13 A14 A15 A16 A17 A18 A19 A20 A21 A22 A23 A24 A25 A26 A27 A28 A29 A30 A31 A32 A33 A34 A35 A36 A37 A38 A39 A40 A41 A42 A43 A44 A45 A46 A47 A48 A49 A50 A51 A52 A53 A54 A55 A56 A57 A58 A59 A60 A61 A62 A63 A64 A65 A66 A67 A68 A69 A70 A71 A72 A73 A74 A75 A76 A77 A78 A79 A80 A1 | A81 L0 | A83 A84 A85 A86 A87 A88 A89 A90 A91 A92 A93 A94 A95 A96 A97 A98 A99 A100 A101 A102 A103 A104 A105 A106 A107 A108 A109 A110 A111 A112 A113 A114 A115 A116 A117 A118 A119 A120 A121 A82 | L1 L2 L3 L4
shell "Shell1" thickness 0.6 removed faces 1 at (10, -0.2024, 43.481)
sketch "Sketch3" plane through (0.6, -7.7796, 20.1075) normal (1, 0, 0) x (0, 0, -1)
  circle A0 centre (-11.7269, 11.5268) radius 0.8
  circle A1 centre (-27.0563, 10.9578) radius 3.5 projected
  circle A2 centre (-11.7269, 11.5268) radius 1.5
  circle A3 centre (-27.0235, 10.969) radius 2.4
  point P0 (20.1075, 7.7796)
  dimension "d3" = 3
  dimension "d19" = 4.8
  dimension "d20" = 1.6
extrude "Extrusion3" add sketch "Sketch3" along normal blind 2
fillet "Fillet1" radius 0.2 4 edges at (2.6, 3.1894, 49.531) (2.6, 3.1782, 50.6638) (2.6, 3.7472, 32.6344) (2.6, 3.7472, 33.3344)
sketch "Sketch4" plane through (0, 0, 0) normal (-1, 0, 0) x (0, 0, 1)
  circle A0 centre (47.1638, -5.3218) radius 1.45
  circle A1 centre (47.1638, 11.6782) radius 1.45
  point P0 (0, 0)
  dimension "d13" = 2.9
  dimension "d14" = 2.9
extrude "Extrusion4" cut sketch "Sketch4" against normal through all
sketch "Sketch5" plane through (0, 0, 0) normal (-1, 0, 0) x (0, 0, 1)
  circle A0 centre (47.1638, 3.1782) radius 3.5
  circle A1 centre (47.1638, 3.1782) radius 12.5
  circle A2 centre (47.1638, 11.6782) radius 1.45 projected
  circle A3 centre (47.1638, -5.3218) radius 1.25
  line L0 (55.4678, -8.3796) -> (55.4678, 16.152) projected
  line L1 (55.4678, -6.1649) -> (55.4678, 12.5213)
  point P0 (0, 0)
extrude "Extrusion5" add sketch "Sketch5" along normal blind 2.5 contours L0 A1 picked at (53.8665, 3.1782)
sketch "Sketch7" plane through (-2.5, 0, 0) normal (-1, 0, 0) x (0, 0, 1)
  circle A0 centre (47.1638, 3.1782) radius 3.5 projected
  circle A1 centre (47.131, 3.1894) radius 2.4 projected
  point P0 (0, 0)
extrude "Extrusion7" cut sketch "Sketch7" against normal through all contours A1
sketch "Sketch8" plane through (-2.5, 0, 0) normal (-1, 0, 0) x (0, 0, 1)
  circle A0 centre (47.1638, -5.3218) radius 1.45 projected
  point P0 (0, 0)
extrude "Extrusion8" cut sketch "Sketch8" against normal through all
properties part number "GearHolder"
